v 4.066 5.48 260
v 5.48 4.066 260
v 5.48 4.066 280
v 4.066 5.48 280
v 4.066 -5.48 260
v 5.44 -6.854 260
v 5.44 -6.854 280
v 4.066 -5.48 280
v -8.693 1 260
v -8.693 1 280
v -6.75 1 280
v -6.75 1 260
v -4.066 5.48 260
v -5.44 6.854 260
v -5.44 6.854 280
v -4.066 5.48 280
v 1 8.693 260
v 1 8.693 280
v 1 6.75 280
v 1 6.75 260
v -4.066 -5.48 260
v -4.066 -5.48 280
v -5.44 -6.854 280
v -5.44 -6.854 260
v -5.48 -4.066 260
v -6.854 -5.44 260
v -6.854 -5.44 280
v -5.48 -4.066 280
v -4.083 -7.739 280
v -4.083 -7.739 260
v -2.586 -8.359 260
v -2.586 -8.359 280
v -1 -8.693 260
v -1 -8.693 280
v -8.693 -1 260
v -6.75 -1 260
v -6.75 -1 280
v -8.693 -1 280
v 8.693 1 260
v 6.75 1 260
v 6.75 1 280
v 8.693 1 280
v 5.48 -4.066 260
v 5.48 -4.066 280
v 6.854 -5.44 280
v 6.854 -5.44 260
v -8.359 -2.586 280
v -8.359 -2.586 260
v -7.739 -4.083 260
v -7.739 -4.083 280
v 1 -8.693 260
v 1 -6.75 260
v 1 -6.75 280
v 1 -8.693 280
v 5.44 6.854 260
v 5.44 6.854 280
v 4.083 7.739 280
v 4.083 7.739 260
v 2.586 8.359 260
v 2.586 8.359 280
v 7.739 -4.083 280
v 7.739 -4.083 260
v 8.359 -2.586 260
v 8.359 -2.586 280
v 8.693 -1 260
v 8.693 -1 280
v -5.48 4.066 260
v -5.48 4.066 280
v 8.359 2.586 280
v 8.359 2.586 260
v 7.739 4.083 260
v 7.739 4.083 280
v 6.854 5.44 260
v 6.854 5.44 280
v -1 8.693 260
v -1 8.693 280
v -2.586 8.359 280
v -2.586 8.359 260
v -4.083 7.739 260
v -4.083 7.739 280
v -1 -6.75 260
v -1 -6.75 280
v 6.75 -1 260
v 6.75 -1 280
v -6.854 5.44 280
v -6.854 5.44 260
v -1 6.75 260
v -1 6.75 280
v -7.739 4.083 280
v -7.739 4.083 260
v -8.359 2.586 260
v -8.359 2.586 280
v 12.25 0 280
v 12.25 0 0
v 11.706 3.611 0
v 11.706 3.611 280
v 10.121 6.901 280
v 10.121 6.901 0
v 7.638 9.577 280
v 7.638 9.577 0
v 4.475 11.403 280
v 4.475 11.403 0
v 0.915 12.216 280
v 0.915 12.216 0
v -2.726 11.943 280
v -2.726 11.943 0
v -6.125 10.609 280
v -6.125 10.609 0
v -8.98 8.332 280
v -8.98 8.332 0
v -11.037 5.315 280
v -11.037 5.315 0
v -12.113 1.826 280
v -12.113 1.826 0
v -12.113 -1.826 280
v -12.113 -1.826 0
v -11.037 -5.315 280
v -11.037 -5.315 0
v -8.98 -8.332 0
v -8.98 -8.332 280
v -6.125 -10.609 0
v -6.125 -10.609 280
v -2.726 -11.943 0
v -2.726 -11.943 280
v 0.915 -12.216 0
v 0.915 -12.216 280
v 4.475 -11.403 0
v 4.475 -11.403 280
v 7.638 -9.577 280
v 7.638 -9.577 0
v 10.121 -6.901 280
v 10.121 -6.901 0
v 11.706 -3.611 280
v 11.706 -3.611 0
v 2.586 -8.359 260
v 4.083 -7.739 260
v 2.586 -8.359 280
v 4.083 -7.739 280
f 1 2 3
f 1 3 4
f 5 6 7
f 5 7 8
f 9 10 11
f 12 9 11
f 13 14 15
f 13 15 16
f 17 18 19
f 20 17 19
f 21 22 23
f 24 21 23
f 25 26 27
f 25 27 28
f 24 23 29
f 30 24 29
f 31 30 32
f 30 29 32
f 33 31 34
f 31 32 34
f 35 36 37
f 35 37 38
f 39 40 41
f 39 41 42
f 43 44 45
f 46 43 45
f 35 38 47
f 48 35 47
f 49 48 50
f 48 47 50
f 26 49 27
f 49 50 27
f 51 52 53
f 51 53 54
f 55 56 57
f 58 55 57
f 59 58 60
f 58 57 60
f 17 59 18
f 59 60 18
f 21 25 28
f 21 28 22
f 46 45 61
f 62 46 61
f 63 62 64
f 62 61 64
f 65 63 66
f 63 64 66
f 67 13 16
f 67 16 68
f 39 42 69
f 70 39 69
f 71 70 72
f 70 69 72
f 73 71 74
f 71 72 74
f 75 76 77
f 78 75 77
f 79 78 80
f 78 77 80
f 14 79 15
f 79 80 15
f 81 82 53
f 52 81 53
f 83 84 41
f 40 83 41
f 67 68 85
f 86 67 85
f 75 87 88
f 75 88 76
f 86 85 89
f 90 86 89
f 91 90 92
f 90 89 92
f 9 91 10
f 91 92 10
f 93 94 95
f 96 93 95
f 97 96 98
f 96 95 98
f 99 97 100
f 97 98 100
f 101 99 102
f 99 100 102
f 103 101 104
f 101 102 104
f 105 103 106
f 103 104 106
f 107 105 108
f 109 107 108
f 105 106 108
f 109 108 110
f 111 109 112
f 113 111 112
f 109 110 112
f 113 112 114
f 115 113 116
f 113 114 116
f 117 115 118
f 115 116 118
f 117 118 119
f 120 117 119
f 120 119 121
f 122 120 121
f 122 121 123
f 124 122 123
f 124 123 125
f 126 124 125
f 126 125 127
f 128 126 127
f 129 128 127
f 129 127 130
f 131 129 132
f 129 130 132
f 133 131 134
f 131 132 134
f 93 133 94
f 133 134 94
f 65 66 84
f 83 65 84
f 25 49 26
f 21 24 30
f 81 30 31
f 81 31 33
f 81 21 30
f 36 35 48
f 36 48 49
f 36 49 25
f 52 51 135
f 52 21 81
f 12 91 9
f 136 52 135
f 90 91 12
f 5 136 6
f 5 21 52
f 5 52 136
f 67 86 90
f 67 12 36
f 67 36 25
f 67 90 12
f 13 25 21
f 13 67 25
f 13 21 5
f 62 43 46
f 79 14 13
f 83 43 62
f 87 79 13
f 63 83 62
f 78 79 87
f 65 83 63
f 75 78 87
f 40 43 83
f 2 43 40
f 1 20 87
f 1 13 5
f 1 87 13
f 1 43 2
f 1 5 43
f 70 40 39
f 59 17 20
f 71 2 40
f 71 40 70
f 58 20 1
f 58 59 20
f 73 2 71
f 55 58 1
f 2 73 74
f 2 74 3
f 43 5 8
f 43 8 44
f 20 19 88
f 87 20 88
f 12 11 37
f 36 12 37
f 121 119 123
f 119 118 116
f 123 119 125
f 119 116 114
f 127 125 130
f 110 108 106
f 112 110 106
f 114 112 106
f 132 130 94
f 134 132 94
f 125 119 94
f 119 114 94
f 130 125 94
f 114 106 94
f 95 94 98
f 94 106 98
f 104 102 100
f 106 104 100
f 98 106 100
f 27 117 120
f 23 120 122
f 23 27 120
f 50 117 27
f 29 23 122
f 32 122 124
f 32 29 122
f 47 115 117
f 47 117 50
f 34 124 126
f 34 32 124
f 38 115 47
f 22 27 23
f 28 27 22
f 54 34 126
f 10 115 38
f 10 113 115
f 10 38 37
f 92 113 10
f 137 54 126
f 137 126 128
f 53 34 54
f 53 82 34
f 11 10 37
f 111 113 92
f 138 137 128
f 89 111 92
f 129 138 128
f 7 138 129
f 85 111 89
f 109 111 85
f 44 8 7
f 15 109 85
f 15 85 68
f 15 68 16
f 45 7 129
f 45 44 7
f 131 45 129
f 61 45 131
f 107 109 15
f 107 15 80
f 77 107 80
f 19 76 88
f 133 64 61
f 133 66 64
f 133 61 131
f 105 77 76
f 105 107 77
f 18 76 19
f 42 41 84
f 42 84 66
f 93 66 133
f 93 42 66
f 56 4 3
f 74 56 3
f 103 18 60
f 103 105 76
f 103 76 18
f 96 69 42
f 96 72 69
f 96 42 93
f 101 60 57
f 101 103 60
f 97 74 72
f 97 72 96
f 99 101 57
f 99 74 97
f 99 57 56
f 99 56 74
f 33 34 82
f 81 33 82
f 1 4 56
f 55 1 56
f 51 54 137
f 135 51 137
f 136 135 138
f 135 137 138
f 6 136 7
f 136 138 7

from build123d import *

# Parameters (mm, degrees)
SKETCH1_R           = 12.25
BOSS_EXTRUDE1_DEPTH = 280
CUT_EXTRUDE1_DEPTH  = 20


with BuildPart() as part:
    # Sketch1 → Boss-Extrude1 (new body)
    with BuildSketch(Plane.XY):
        Circle(SKETCH1_R)
    extrude(amount=BOSS_EXTRUDE1_DEPTH)

    # Sketch2 → Cut-Extrude1 (cut)
    with BuildSketch(Plane.XY.offset(280)):
        with BuildLine():
            Line((1, 6.75), (-1, 6.75))
            Line((-1, 6.75), (-1, 8.692669325))
            ThreePointArc((-1, 8.692669325), (-3.348480033, 8.083945909), (-5.439538645, 6.853752208))
            Line((-5.439538645, 6.853752208), (-4.065863992, 5.480077554))
            Line((-4.065863992, 5.480077554), (-5.480077554, 4.065863992))
            Line((-5.480077554, 4.065863992), (-6.853752208, 5.439538645))
            ThreePointArc((-6.853752208, 5.439538645), (-8.083945909, 3.348480033), (-8.692669325, 1))
            Line((-8.692669325, 1), (-6.75, 1))
            Line((-6.75, 1), (-6.75, -1))
            Line((-6.75, -1), (-8.692669325, -1))
            ThreePointArc((-8.692669325, -1), (-8.083945909, -3.348480033), (-6.853752208, -5.439538645))
            Line((-6.853752208, -5.439538645), (-5.480077554, -4.065863992))
            Line((-5.480077554, -4.065863992), (-4.065863992, -5.480077554))
            Line((-4.065863992, -5.480077554), (-5.439538645, -6.853752208))
            ThreePointArc((-5.439538645, -6.853752208), (-3.348480033, -8.083945909), (-1, -8.692669325))
            Line((-1, -8.692669325), (-1, -6.75))
            Line((-1, -6.75), (1, -6.75))
            Line((1, -6.75), (1, -8.692669325))
            ThreePointArc((1, -8.692669325), (3.348480033, -8.083945909), (5.439538645, -6.853752208))
            Line((5.439538645, -6.853752208), (4.065863992, -5.480077554))
            Line((4.065863992, -5.480077554), (5.480077554, -4.065863992))
            Line((5.480077554, -4.065863992), (6.853752208, -5.439538645))
            ThreePointArc((6.853752208, -5.439538645), (8.083945909, -3.348480033), (8.692669325, -1))
            Line((8.692669325, -1), (6.75, -1))
            Line((6.75, -1), (6.75, 1))
            Line((6.75, 1), (8.692669325, 1))
            ThreePointArc((8.692669325, 1), (8.083945909, 3.348480033), (6.853752208, 5.439538645))
            Line((6.853752208, 5.439538645), (5.480077554, 4.065863992))
            Line((5.480077554, 4.065863992), (4.065863992, 5.480077554))
            Line((4.065863992, 5.480077554), (5.439538645, 6.853752208))
            ThreePointArc((5.439538645, 6.853752208), (3.348480033, 8.083945909), (1, 8.692669325))
            Line((1, 8.692669325), (1, 6.75))
        make_face()
    extrude(amount=-CUT_EXTRUDE1_DEPTH, mode=Mode.SUBTRACT)


solid = part.part
